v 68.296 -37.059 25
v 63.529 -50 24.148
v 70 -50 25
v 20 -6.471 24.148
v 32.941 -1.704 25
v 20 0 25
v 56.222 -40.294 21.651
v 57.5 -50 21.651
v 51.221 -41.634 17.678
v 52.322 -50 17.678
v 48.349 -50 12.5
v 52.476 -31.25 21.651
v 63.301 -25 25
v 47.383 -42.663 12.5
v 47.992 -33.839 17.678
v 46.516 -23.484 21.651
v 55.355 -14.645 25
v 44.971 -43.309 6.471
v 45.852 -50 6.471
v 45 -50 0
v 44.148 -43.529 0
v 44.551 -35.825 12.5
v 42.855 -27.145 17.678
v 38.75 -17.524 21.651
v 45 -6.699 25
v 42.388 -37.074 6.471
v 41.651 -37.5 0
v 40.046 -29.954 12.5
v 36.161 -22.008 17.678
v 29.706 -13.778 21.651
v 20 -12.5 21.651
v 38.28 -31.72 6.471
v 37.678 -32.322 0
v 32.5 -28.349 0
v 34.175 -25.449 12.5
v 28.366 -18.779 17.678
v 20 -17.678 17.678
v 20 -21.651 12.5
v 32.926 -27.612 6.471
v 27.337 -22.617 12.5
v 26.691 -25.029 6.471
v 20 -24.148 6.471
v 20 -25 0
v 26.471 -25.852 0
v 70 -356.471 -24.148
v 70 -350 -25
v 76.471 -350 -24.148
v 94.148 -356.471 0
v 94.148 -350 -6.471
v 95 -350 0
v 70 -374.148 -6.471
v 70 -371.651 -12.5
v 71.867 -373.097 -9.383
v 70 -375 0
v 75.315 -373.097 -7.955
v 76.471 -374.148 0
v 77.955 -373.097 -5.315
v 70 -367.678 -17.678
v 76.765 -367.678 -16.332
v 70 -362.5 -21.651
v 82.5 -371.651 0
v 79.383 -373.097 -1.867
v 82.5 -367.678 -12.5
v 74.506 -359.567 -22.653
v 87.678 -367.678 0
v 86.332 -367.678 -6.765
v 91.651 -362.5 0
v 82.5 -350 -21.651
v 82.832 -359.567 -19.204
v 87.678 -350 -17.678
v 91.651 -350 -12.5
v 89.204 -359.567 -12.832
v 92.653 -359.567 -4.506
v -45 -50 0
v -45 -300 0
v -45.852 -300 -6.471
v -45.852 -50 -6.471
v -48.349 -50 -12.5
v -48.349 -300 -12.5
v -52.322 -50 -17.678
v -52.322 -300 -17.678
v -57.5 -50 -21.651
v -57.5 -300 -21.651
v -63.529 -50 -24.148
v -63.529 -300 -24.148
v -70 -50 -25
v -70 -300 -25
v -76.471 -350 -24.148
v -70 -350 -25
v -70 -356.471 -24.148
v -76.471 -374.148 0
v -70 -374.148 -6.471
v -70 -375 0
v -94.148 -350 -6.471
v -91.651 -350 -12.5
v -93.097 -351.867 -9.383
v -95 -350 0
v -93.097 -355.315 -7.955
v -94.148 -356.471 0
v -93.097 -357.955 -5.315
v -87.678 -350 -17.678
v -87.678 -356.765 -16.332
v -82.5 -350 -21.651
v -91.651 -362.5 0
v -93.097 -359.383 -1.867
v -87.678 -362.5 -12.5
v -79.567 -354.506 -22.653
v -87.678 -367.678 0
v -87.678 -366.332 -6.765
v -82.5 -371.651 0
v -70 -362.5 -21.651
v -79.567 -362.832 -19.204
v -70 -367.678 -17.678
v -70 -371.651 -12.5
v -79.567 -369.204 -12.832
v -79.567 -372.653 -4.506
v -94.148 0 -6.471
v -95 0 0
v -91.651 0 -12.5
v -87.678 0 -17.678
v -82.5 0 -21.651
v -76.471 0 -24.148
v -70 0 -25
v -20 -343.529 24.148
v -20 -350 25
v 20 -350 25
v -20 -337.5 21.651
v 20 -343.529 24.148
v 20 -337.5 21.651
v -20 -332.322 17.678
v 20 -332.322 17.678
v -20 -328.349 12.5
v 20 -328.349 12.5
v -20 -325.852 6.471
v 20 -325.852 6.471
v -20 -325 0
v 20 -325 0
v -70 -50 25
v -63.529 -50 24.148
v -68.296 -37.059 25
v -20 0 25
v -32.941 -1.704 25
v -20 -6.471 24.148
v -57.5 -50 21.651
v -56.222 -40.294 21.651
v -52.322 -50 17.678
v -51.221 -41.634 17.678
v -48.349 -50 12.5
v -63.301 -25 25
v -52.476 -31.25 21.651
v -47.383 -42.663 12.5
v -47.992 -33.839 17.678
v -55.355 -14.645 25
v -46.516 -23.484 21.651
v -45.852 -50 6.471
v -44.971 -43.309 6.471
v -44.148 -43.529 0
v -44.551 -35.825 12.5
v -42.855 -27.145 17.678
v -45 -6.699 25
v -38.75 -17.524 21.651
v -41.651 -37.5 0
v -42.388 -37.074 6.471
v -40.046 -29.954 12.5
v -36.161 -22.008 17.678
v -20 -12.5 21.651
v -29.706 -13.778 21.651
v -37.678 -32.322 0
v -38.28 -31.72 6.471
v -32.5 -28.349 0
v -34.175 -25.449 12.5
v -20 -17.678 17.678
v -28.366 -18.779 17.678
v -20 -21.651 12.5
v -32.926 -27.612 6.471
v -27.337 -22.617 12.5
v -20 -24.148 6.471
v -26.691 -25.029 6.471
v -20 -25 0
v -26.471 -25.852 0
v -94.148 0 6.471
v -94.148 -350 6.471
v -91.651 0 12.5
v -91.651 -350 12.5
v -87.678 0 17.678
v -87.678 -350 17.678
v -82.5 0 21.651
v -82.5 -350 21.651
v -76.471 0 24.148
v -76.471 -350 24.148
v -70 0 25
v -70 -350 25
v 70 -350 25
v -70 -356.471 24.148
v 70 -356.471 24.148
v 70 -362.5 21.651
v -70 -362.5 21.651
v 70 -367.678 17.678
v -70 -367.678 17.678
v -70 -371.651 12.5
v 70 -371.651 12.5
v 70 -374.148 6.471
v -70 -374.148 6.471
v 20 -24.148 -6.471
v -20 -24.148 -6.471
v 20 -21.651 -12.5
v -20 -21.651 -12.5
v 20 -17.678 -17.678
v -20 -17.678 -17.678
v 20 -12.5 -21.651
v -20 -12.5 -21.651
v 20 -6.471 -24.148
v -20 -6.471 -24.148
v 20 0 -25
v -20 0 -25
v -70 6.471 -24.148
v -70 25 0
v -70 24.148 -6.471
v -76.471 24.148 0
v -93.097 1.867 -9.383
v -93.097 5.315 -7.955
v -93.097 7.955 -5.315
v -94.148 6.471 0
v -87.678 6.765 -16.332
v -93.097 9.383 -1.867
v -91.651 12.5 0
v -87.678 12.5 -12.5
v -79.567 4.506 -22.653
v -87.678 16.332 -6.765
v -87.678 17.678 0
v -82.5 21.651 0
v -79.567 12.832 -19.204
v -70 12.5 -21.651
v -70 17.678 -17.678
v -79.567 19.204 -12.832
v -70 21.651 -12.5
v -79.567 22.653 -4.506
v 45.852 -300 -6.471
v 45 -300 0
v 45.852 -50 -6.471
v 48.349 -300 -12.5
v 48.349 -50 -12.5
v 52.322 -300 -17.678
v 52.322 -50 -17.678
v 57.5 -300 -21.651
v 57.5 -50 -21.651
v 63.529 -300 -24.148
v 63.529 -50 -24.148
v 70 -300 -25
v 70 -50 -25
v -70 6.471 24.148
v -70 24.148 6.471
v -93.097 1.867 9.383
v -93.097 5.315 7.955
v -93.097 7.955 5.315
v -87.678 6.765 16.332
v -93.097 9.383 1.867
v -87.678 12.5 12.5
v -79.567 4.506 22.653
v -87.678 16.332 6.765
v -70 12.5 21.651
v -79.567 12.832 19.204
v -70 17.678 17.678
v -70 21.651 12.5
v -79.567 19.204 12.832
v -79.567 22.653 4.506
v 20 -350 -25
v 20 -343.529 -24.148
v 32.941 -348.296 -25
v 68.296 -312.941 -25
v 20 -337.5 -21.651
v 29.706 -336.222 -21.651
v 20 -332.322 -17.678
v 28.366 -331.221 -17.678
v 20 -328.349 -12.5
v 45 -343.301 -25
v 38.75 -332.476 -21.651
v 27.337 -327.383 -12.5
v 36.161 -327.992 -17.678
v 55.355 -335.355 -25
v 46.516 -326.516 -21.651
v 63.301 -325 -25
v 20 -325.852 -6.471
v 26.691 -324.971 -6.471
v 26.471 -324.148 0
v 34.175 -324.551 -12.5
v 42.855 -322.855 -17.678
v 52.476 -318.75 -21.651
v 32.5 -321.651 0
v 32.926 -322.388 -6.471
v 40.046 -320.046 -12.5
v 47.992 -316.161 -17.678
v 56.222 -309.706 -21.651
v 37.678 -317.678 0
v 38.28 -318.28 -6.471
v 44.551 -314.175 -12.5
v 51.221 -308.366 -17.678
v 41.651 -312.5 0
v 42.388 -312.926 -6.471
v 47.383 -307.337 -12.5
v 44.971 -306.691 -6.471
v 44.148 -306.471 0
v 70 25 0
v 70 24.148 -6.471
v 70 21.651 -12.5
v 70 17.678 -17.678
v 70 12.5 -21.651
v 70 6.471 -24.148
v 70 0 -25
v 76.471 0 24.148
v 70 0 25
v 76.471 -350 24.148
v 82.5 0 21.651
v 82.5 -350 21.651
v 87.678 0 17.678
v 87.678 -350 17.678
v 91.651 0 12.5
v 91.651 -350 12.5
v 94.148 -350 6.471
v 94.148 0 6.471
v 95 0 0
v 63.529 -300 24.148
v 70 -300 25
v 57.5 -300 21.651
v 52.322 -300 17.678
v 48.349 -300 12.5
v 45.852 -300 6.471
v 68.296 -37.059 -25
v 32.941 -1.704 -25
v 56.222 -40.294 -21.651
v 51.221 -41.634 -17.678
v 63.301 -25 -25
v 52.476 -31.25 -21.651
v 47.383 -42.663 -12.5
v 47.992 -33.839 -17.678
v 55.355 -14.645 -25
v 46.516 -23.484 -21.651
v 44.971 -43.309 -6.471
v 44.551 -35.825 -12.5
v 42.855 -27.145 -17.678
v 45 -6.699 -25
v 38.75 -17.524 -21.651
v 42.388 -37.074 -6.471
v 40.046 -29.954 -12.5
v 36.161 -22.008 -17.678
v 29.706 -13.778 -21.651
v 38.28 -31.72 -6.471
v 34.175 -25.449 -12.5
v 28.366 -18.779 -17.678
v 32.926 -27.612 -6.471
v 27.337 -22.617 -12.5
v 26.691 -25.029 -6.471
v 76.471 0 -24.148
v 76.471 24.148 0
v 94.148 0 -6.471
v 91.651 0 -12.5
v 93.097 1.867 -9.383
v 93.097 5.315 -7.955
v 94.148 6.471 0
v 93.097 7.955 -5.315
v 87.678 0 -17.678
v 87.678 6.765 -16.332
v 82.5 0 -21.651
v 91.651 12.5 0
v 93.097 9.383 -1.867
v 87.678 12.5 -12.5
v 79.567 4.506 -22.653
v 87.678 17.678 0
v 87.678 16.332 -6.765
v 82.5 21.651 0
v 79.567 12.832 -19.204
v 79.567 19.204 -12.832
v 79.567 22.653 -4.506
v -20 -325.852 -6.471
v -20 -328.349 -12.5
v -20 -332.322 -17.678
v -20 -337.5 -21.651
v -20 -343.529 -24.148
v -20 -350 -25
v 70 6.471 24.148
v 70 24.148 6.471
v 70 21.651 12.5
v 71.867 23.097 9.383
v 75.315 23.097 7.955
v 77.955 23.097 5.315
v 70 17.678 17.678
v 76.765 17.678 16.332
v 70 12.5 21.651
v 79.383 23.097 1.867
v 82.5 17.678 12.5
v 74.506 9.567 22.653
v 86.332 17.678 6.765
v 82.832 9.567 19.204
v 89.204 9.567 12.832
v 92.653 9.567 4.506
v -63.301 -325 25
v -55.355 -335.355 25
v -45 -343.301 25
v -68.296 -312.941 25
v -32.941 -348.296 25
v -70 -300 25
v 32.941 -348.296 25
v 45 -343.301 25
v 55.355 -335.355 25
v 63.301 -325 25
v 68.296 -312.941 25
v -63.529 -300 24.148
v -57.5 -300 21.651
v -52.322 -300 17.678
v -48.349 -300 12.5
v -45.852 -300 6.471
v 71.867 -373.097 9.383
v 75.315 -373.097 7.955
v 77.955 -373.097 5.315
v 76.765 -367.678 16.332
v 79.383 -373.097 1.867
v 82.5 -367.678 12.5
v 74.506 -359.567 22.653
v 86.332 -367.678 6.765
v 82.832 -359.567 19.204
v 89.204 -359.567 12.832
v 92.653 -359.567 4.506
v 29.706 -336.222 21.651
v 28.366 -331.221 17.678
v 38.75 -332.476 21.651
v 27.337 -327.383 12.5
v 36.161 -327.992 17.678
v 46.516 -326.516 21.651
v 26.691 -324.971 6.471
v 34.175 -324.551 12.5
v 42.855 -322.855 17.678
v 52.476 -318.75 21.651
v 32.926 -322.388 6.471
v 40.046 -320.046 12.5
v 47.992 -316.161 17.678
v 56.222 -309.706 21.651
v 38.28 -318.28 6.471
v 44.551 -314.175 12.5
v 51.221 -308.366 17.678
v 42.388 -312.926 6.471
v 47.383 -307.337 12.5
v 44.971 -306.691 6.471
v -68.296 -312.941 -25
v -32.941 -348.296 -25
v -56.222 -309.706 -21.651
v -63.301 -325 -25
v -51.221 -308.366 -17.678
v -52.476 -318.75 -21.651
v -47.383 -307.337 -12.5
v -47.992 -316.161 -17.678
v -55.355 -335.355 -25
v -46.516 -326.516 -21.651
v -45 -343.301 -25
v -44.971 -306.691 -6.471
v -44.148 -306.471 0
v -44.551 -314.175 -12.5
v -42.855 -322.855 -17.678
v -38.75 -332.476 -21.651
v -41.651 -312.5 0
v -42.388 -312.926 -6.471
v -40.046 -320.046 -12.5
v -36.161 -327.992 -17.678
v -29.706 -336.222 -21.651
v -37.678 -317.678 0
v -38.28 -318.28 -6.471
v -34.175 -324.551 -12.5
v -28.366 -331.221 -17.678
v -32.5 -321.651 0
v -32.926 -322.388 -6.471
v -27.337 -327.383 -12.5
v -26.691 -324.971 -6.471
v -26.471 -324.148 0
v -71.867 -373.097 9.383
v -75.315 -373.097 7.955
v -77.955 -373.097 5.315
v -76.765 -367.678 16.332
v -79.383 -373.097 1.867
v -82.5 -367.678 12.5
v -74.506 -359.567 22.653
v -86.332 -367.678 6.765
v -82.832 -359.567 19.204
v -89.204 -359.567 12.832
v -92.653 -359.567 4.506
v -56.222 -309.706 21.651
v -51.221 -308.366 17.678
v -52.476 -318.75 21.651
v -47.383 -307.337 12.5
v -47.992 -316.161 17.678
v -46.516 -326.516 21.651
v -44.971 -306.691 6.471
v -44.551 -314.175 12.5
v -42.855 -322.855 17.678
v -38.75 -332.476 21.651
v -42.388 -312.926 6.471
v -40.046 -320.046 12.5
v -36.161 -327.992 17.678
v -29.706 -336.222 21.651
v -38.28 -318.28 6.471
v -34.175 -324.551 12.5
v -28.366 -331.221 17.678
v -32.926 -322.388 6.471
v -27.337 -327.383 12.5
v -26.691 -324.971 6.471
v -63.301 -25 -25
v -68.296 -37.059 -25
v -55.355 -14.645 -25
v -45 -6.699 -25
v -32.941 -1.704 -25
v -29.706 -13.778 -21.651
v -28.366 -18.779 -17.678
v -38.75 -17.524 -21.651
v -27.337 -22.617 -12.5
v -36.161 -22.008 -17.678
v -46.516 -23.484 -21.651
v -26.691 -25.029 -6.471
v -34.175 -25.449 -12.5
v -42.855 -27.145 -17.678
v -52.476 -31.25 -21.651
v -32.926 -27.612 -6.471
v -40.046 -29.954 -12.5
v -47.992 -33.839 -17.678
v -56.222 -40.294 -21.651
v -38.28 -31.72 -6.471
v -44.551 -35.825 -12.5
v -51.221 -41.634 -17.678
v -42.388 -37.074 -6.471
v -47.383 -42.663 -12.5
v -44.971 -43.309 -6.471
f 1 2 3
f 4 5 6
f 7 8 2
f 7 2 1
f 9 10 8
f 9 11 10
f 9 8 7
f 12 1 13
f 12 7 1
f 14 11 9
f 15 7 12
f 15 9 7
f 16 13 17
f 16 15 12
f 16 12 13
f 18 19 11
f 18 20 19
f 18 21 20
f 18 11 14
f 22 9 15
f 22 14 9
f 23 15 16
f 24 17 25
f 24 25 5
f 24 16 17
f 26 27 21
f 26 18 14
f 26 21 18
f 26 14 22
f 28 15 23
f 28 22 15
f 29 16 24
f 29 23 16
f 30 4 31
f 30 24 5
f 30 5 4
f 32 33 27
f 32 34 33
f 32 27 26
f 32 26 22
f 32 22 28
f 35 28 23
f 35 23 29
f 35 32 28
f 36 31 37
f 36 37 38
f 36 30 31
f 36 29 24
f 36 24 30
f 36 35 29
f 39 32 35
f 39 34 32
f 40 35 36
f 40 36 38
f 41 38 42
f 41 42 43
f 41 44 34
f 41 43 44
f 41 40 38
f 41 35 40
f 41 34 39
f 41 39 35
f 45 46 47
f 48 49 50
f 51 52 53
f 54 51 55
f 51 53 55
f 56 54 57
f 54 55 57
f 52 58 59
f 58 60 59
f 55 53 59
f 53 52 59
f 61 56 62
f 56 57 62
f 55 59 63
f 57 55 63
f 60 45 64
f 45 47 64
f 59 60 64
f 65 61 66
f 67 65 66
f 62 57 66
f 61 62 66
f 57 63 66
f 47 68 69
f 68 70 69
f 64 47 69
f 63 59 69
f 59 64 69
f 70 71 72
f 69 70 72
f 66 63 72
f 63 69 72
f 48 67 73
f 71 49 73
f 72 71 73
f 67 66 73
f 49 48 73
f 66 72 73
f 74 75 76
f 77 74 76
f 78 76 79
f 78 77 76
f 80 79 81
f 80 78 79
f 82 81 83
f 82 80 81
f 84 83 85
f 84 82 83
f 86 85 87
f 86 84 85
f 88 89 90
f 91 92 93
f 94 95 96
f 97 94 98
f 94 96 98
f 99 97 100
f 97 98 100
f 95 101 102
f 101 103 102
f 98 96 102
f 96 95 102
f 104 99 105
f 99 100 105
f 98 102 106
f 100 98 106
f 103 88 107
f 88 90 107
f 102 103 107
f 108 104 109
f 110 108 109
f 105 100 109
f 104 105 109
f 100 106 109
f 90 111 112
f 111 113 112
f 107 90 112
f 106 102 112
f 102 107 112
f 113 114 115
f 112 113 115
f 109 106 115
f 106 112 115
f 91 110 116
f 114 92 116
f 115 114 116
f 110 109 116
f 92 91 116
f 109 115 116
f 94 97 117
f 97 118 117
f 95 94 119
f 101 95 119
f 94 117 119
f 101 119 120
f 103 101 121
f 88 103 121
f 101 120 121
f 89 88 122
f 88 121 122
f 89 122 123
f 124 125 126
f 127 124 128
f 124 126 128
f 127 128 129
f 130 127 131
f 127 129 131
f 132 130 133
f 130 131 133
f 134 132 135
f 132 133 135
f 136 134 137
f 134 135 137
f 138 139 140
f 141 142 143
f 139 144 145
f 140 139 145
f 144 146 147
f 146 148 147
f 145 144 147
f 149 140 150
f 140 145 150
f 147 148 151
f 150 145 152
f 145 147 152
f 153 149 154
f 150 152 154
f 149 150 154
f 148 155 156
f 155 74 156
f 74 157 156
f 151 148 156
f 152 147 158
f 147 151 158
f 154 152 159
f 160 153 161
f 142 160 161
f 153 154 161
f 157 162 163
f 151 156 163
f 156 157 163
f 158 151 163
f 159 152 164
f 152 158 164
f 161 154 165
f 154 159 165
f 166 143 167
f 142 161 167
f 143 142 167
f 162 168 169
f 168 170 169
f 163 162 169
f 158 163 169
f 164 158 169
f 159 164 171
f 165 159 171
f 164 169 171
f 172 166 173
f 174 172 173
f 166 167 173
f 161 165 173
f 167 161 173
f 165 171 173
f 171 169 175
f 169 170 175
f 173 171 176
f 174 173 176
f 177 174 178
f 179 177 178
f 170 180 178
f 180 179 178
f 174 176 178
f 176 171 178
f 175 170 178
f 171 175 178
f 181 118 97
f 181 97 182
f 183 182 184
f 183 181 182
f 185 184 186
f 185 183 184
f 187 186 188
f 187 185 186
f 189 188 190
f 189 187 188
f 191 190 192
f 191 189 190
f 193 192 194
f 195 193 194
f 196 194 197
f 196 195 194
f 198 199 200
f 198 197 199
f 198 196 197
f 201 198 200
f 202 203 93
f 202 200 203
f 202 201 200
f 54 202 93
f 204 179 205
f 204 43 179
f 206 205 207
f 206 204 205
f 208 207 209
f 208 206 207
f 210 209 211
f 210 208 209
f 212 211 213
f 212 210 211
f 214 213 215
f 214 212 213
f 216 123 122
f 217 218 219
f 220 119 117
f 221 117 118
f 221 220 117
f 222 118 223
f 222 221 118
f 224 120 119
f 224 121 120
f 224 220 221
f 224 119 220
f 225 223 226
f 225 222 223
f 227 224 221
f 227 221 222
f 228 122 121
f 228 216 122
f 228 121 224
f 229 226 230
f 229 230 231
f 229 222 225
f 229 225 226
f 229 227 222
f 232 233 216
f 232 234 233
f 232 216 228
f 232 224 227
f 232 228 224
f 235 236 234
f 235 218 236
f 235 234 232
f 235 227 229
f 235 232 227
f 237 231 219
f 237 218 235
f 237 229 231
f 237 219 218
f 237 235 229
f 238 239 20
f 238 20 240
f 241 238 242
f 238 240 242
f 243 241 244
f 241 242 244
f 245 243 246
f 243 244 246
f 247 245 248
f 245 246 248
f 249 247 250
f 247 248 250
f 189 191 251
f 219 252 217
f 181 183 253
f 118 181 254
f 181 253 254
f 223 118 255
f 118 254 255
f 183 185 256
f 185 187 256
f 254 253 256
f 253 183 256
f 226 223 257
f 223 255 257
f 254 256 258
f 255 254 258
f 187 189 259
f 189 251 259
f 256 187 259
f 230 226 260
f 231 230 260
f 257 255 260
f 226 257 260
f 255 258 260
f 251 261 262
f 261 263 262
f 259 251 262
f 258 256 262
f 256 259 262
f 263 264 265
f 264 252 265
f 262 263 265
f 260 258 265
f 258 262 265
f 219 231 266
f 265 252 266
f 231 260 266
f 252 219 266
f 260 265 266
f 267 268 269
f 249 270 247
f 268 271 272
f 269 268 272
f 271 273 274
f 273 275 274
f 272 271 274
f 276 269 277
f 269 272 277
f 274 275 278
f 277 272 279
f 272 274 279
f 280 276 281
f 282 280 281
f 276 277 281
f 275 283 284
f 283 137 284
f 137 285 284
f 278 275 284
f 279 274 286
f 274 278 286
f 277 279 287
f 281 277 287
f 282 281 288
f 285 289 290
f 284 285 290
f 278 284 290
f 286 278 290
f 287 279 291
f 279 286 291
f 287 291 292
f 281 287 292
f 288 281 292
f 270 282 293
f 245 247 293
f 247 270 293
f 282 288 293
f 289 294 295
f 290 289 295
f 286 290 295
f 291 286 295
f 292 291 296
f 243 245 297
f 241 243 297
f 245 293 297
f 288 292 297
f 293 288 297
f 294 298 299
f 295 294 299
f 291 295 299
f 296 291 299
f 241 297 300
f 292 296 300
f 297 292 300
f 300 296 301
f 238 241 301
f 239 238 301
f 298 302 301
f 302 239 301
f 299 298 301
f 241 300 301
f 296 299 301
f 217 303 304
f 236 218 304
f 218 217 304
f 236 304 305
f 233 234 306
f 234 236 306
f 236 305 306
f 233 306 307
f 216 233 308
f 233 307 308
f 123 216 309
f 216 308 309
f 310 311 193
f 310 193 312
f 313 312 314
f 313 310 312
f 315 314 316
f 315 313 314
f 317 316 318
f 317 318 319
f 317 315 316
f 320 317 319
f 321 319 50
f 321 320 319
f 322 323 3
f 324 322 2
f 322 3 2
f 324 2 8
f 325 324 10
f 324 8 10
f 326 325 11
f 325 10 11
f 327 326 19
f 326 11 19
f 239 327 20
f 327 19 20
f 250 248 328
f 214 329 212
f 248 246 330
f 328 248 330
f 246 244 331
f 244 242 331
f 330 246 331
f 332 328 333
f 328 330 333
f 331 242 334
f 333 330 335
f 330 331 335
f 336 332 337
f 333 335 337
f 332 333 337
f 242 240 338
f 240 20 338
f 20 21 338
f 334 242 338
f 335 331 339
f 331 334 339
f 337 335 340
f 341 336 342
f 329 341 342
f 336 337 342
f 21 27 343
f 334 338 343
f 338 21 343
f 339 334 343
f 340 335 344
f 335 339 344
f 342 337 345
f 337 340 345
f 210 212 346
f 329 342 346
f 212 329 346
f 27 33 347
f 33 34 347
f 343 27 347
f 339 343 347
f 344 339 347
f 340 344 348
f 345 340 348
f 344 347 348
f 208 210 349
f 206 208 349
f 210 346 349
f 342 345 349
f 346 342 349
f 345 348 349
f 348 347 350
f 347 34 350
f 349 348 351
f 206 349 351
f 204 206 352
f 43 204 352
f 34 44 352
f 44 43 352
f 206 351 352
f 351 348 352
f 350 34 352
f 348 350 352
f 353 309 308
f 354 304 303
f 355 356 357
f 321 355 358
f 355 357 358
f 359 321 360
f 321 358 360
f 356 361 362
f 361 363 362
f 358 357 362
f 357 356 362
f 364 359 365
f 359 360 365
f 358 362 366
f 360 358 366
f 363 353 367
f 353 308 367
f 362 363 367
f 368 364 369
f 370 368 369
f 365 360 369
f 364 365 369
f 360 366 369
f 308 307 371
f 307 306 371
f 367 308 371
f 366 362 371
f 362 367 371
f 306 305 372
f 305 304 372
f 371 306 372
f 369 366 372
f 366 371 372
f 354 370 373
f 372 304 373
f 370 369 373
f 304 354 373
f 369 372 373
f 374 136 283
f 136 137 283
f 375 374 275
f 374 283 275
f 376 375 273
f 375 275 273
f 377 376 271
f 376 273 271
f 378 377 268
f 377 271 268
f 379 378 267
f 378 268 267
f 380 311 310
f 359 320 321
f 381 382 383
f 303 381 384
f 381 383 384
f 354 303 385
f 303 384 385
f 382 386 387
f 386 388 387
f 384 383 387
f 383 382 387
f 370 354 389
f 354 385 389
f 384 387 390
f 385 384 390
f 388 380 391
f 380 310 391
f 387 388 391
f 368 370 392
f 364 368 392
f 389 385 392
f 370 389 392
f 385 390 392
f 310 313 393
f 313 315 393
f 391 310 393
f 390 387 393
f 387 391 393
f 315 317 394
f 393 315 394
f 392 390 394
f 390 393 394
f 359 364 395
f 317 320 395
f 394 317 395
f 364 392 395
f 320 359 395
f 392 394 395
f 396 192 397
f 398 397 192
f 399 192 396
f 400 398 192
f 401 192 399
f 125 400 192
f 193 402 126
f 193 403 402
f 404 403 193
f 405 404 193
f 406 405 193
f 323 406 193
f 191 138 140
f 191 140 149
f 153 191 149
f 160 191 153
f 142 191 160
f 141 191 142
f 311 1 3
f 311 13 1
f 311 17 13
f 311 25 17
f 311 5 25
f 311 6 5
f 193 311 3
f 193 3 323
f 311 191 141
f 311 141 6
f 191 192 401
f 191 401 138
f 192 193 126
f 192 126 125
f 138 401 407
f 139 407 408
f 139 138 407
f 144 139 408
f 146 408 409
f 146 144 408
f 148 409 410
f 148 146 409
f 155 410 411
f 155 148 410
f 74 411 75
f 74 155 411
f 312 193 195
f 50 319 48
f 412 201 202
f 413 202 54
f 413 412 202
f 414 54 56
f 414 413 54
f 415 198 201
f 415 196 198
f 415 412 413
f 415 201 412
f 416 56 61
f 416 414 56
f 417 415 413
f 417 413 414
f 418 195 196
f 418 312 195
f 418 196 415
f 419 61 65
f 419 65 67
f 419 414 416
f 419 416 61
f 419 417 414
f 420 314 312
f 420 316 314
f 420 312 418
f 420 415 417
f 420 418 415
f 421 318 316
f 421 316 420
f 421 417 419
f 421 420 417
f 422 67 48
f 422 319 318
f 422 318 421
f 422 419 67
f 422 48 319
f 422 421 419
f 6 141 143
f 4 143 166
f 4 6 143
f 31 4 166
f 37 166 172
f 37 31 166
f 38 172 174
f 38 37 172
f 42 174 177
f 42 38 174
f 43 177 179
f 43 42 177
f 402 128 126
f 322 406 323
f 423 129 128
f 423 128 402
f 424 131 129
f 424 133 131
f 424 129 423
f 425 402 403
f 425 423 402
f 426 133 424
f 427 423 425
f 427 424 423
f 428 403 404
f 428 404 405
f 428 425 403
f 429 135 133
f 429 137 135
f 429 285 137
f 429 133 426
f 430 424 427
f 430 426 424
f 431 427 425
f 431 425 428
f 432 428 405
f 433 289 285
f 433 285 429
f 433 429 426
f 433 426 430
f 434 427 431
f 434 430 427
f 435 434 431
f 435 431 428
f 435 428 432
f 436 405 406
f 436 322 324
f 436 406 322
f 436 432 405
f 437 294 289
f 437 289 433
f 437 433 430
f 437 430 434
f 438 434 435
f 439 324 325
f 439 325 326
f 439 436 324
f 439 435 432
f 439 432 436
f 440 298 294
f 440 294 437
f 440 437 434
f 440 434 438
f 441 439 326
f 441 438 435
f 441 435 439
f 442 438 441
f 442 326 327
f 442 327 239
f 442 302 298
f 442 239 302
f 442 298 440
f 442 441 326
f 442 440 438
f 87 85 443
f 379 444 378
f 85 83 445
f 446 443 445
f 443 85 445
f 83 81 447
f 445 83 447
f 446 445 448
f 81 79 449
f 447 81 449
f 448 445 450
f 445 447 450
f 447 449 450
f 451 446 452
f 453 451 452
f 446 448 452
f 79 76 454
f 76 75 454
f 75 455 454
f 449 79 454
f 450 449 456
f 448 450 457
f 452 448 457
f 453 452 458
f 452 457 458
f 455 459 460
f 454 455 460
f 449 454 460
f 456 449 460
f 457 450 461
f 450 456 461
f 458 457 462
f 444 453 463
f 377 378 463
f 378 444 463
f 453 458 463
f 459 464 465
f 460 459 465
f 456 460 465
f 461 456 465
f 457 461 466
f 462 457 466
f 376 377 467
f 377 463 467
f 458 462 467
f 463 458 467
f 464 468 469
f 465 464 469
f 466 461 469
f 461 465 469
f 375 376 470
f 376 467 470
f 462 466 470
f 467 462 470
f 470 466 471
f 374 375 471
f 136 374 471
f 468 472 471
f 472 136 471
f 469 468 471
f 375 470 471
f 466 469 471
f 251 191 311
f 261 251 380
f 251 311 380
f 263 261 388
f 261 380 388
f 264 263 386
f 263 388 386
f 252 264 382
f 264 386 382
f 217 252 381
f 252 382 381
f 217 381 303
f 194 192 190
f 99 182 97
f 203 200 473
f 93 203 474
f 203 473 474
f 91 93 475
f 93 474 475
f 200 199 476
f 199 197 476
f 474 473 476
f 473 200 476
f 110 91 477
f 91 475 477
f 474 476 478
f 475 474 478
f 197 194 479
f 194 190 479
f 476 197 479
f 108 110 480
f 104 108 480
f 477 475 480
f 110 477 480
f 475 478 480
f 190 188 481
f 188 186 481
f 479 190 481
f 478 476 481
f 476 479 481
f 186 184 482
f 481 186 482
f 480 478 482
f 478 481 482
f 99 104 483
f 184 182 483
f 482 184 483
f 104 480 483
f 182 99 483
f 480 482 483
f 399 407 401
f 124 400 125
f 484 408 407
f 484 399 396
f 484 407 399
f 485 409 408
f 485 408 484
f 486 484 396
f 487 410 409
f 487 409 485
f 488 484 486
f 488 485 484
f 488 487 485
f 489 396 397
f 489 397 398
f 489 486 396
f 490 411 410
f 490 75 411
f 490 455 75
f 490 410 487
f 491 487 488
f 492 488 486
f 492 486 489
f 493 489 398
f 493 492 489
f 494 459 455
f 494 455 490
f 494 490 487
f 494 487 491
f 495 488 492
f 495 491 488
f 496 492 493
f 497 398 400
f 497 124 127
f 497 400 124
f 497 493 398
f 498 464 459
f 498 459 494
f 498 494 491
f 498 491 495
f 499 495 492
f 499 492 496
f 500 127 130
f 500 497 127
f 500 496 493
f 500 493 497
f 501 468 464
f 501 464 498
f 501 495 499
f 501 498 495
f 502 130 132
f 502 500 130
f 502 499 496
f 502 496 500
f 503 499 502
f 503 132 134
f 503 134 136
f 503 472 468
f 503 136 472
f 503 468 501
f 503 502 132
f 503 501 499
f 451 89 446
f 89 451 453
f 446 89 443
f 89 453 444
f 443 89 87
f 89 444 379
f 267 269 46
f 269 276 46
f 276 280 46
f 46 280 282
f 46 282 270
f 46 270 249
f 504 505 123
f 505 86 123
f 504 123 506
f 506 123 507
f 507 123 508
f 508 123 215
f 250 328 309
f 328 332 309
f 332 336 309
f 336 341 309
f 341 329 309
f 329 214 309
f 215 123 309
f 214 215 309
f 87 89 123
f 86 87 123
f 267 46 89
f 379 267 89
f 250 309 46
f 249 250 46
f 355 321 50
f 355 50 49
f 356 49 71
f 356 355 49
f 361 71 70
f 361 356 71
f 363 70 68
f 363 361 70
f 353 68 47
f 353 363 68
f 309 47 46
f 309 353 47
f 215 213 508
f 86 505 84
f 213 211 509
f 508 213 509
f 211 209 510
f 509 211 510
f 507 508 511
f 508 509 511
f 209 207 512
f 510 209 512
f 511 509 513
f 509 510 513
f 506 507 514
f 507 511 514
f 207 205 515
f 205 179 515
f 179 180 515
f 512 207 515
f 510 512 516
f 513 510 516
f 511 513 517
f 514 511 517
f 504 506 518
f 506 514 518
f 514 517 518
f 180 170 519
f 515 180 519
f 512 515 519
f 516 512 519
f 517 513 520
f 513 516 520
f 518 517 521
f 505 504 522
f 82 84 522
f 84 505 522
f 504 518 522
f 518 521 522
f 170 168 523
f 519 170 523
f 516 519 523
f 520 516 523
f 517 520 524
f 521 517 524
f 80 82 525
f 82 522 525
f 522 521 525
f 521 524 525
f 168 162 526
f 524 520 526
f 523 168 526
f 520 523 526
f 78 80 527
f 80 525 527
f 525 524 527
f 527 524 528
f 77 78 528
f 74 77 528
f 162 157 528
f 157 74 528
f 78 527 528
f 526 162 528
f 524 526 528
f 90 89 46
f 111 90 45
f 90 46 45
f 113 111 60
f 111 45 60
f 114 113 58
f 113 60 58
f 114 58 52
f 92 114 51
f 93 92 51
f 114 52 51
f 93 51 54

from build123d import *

# Parameters (mm, degrees)
SKETCH1_W           = 190
SKETCH1_H           = 400
SKETCH1_W_2         = 90
SKETCH1_H_2         = 300
BOSS_EXTRUDE1_DEPTH = 25
FILLET1_R           = 25


with BuildPart() as part:
    # Sketch1 → Boss-Extrude1 (new, symmetric)
    with BuildSketch(Plane.XY):
        with Locations((0, -175)):
            Rectangle(SKETCH1_W, SKETCH1_H)
        with Locations((0, -175)):
            Rectangle(SKETCH1_W_2, SKETCH1_H_2, mode=Mode.SUBTRACT)
    extrude(amount=BOSS_EXTRUDE1_DEPTH, both=True)

    # Fillet1
    fillet1_edges = [part.edges().sort_by_distance(p)[0] for p in [
        (95, -175, 25),
        (0, 25, 25),
        (-45, -175, -25),
        (-45, -25, 0),
        (0, -325, -25),
        (-45, -325, 0),
        (45, -175, -25),
        (45, -325, 0),
        (0, -25, -25),
        (45, -25, 0),
        (-45, -175, 25),
        (0, -325, 25),
        (45, -175, 25),
        (0, -25, 25),
        (-95, -175, 25),
        (0, 25, -25),
        (95, -175, -25),
        (0, -375, -25),
        (-95, -175, -25),
        (0, -375, 25),
        (-95, 25, 0),
        (95, 25, 0),
        (95, -375, 0),
        (-95, -375, 0),
    ]]
    fillet(fillet1_edges, radius=FILLET1_R - 0.0001)  # a hair under: the kernel refuses the full size


solid = part.part
